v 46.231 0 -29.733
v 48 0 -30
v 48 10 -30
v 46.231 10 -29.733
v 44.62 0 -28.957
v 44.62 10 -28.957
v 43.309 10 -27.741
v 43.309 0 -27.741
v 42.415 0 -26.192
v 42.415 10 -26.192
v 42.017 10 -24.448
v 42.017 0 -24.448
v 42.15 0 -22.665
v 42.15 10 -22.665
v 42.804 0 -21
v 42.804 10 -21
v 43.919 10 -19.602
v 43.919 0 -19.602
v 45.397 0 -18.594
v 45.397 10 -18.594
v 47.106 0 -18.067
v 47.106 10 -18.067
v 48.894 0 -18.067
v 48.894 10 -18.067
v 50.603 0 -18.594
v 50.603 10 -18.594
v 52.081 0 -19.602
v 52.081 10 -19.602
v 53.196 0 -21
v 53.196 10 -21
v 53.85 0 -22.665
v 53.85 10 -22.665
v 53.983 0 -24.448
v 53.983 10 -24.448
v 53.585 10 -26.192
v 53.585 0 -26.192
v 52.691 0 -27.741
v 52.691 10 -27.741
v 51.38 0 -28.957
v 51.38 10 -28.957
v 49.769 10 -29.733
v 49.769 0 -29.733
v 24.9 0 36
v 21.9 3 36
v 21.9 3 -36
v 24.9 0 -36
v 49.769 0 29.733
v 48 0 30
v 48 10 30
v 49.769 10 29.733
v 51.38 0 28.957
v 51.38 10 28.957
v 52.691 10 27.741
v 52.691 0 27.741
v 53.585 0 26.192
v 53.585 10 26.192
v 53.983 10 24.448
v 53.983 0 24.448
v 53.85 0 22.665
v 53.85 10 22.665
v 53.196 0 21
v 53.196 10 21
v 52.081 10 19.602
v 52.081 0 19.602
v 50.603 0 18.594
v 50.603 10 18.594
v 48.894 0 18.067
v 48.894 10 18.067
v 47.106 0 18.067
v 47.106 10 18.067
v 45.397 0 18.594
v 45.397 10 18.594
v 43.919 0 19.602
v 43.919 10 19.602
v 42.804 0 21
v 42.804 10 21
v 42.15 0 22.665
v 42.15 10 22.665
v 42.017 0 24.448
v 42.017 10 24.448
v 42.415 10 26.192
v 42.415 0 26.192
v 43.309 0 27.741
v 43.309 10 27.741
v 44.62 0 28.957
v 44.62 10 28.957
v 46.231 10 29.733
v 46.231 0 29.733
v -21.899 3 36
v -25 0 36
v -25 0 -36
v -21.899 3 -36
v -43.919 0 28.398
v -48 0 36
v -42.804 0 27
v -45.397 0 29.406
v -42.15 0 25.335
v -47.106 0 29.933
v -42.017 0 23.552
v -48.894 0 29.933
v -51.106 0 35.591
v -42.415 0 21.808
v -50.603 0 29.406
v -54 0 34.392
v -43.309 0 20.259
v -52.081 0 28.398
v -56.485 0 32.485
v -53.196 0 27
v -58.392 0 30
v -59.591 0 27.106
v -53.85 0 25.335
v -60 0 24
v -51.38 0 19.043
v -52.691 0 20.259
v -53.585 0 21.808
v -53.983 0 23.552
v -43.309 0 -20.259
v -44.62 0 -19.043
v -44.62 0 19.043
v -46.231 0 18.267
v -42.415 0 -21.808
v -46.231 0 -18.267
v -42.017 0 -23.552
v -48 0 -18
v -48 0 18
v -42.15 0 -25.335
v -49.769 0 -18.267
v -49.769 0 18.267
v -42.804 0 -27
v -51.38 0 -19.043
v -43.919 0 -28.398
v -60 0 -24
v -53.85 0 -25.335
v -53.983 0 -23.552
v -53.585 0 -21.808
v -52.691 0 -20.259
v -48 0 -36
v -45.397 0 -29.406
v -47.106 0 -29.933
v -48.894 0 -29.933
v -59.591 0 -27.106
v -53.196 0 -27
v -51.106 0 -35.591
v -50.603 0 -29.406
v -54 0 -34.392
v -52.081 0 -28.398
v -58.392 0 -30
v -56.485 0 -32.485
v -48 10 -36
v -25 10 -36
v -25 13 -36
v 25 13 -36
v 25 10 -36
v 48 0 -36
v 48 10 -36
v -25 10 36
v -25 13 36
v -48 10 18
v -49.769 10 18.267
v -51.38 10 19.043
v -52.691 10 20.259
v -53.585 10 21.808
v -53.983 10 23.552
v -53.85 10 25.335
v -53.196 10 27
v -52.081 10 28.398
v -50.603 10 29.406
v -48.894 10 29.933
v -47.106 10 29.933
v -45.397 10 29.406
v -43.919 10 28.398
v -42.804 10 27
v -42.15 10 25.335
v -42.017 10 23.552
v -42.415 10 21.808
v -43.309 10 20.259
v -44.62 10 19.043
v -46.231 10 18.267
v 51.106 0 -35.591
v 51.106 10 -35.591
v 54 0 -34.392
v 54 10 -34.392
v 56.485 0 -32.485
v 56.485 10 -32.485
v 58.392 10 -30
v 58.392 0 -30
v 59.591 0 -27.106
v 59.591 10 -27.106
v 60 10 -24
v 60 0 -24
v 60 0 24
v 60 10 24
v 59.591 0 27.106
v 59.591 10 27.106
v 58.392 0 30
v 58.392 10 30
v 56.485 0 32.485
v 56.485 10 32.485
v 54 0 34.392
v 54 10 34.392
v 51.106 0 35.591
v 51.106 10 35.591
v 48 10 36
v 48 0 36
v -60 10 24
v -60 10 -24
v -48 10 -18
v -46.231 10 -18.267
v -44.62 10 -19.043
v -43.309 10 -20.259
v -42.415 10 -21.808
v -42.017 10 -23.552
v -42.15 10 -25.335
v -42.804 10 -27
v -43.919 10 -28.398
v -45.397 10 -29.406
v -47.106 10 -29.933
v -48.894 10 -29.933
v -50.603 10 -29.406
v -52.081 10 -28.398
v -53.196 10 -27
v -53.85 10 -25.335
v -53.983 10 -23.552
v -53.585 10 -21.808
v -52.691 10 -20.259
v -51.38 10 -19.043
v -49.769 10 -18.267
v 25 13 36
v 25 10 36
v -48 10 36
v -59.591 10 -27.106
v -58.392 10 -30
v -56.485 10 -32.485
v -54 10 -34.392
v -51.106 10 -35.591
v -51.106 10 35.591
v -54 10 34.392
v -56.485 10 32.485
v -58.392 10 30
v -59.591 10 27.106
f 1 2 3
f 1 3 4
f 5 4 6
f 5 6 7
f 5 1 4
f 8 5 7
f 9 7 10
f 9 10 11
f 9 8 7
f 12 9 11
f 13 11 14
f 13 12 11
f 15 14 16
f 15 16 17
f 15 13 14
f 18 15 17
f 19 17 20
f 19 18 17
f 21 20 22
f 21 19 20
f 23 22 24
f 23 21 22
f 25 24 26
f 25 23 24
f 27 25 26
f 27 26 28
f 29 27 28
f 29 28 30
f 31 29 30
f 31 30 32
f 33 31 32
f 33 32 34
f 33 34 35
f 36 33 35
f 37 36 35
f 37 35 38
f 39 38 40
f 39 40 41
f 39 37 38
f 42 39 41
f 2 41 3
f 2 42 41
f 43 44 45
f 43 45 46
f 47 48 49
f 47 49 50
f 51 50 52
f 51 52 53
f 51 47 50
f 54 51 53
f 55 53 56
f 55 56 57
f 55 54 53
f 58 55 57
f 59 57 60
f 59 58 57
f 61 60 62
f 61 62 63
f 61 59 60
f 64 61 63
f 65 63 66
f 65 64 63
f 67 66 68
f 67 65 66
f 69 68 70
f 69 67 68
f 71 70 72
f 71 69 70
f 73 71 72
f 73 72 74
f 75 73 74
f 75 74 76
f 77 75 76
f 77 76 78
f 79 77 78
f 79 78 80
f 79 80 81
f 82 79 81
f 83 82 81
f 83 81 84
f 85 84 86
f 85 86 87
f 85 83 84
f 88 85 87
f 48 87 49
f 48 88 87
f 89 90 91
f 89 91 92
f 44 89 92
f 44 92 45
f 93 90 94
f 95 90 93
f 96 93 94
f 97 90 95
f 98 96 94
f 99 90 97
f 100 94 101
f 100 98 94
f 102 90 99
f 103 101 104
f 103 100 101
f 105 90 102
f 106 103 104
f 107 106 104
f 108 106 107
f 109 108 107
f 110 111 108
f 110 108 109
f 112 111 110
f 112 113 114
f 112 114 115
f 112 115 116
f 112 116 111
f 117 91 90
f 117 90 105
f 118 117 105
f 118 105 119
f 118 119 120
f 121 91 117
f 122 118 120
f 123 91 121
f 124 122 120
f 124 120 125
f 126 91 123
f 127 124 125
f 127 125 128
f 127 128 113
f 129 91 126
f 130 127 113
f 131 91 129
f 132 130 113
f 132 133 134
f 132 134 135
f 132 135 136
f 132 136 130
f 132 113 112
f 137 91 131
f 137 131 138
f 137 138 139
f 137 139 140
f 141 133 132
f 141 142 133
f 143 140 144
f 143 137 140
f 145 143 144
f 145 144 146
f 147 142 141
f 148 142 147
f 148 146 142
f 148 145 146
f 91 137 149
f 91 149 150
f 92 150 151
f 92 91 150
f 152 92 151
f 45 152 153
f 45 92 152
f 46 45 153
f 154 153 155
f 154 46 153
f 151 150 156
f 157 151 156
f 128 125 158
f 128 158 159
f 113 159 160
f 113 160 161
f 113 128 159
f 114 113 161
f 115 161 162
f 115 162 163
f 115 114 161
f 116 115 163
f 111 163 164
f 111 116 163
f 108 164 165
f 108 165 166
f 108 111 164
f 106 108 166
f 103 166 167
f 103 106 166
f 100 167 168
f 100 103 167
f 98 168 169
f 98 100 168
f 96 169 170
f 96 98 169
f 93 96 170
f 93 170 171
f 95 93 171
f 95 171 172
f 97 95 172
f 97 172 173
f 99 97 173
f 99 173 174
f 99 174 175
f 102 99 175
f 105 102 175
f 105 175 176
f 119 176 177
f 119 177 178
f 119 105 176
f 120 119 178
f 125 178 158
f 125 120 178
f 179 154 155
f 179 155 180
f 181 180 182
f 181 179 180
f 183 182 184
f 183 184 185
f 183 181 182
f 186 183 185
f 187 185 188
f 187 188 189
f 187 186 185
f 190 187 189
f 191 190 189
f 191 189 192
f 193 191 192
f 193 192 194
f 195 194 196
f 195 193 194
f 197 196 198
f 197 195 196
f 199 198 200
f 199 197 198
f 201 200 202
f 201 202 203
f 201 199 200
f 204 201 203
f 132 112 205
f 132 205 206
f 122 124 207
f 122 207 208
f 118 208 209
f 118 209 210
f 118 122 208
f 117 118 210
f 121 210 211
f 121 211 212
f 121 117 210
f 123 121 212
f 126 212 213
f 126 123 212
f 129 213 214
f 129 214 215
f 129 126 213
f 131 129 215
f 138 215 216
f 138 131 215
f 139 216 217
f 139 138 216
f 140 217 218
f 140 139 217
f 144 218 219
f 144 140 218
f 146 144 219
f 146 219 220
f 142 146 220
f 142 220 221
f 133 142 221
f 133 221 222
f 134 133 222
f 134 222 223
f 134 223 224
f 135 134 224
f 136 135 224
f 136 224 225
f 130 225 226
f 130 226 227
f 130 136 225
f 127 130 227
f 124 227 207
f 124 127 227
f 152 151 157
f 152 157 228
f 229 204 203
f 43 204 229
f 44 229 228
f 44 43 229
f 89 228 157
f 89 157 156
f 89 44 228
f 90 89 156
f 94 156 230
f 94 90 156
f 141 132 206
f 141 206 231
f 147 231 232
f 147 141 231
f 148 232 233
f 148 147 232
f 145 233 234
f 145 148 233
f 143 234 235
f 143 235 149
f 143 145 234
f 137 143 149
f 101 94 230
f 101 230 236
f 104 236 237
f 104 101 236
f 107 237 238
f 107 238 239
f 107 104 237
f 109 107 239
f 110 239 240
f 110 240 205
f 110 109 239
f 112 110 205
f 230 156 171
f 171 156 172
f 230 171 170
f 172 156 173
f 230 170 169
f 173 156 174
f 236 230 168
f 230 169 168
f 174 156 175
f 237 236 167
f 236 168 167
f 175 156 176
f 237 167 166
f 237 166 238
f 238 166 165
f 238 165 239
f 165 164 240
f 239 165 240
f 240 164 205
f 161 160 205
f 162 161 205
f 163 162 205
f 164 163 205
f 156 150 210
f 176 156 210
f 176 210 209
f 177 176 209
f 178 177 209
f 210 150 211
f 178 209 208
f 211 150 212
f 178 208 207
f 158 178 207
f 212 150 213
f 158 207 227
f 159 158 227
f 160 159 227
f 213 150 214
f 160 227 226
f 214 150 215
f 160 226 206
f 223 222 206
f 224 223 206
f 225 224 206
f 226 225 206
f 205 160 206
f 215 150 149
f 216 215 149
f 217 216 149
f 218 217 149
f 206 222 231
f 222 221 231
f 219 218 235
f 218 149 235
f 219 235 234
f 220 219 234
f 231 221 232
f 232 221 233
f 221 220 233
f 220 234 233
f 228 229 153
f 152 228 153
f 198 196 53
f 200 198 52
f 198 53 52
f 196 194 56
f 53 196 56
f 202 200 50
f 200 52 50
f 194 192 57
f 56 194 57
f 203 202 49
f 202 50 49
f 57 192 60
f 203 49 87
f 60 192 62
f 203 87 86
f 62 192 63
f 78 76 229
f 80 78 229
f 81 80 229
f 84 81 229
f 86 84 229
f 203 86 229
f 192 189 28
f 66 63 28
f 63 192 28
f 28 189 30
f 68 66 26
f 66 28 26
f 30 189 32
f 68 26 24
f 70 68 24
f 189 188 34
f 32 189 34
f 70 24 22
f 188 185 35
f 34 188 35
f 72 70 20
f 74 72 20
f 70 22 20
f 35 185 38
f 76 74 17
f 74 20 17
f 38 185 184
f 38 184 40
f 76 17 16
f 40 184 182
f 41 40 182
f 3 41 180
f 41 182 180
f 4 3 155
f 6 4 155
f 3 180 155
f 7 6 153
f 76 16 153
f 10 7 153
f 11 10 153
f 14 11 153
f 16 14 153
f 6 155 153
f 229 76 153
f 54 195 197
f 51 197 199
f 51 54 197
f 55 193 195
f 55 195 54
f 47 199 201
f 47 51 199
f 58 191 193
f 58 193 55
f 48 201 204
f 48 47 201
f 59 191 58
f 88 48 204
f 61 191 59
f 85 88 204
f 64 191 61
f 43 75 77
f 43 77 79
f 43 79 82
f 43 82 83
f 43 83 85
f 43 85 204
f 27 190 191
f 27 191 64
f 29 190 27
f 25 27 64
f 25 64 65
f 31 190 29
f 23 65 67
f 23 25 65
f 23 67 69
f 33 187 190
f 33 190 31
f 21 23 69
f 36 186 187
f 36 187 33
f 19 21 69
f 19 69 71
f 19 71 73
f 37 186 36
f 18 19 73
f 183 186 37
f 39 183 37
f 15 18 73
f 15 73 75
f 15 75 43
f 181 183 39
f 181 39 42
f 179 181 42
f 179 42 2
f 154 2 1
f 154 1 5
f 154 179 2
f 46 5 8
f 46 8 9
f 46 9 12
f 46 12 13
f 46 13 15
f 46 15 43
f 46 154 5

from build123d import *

# Parameters (mm, degrees)
SKETCH1_R           = 6
BOSS_EXTRUDE1_DEPTH = 10
BOSS_EXTRUDE2_DEPTH = 3
CUT_EXTRUDE6_DEPTH  = 500


with BuildPart() as part:
    # Sketch1 → Boss-Extrude1 (new body)
    with BuildSketch(Plane(origin=(0, 0, 0), x_dir=(1, 0, 0), z_dir=(0, 1, 0))):
        with BuildLine():
            Line((0, 36), (48, 36))
            ThreePointArc((48, 36), (56.485281374, 32.485281374), (60, 24))
            Line((60, 24), (60, -24))
            ThreePointArc((60, -24), (56.485281374, -32.485281374), (48, -36))
            Line((48, -36), (-48, -36))
            ThreePointArc((-48, -36), (-56.485281374, -32.485281374), (-60, -24))
            Line((-60, -24), (-60, 24))
            ThreePointArc((-60, 24), (-56.485281374, 32.485281374), (-48, 36))
            Line((-48, 36), (0, 36))
        make_face()
        with Locations(Location((-48, 24, 0), (0, 0, 270))):
            Circle(SKETCH1_R, mode=Mode.SUBTRACT)
        with Locations(Location((48, 24, 0), (0, 0, 90))):
            Circle(SKETCH1_R, mode=Mode.SUBTRACT)
        with Locations(Location((48, -24, 0), (0, 0, 270))):
            Circle(SKETCH1_R, mode=Mode.SUBTRACT)
        with Locations(Location((-48, -24, 0), (0, 0, 90))):
            Circle(SKETCH1_R, mode=Mode.SUBTRACT)
    extrude(amount=BOSS_EXTRUDE1_DEPTH)

    # Sketch2 → Boss-Extrude2 (add)
    with BuildSketch(Plane(origin=(0, 10, 0), x_dir=(1, 0, 0), z_dir=(0, 1, 0))):
        Polygon((-25, 36), (-25, 11.04169411), (-25, -36), (25, -36), (25, 36), align=None)
    extrude(amount=BOSS_EXTRUDE2_DEPTH)

    # Sketch7 → Cut-Extrude6 (cut)
    with BuildSketch(Plane.XY.offset(36)):
        Polygon((-21.898641014, 3), (21.9, 3), (24.9, 0), (-25, 0), align=None)
    extrude(amount=-CUT_EXTRUDE6_DEPTH, mode=Mode.SUBTRACT)


solid = part.part
